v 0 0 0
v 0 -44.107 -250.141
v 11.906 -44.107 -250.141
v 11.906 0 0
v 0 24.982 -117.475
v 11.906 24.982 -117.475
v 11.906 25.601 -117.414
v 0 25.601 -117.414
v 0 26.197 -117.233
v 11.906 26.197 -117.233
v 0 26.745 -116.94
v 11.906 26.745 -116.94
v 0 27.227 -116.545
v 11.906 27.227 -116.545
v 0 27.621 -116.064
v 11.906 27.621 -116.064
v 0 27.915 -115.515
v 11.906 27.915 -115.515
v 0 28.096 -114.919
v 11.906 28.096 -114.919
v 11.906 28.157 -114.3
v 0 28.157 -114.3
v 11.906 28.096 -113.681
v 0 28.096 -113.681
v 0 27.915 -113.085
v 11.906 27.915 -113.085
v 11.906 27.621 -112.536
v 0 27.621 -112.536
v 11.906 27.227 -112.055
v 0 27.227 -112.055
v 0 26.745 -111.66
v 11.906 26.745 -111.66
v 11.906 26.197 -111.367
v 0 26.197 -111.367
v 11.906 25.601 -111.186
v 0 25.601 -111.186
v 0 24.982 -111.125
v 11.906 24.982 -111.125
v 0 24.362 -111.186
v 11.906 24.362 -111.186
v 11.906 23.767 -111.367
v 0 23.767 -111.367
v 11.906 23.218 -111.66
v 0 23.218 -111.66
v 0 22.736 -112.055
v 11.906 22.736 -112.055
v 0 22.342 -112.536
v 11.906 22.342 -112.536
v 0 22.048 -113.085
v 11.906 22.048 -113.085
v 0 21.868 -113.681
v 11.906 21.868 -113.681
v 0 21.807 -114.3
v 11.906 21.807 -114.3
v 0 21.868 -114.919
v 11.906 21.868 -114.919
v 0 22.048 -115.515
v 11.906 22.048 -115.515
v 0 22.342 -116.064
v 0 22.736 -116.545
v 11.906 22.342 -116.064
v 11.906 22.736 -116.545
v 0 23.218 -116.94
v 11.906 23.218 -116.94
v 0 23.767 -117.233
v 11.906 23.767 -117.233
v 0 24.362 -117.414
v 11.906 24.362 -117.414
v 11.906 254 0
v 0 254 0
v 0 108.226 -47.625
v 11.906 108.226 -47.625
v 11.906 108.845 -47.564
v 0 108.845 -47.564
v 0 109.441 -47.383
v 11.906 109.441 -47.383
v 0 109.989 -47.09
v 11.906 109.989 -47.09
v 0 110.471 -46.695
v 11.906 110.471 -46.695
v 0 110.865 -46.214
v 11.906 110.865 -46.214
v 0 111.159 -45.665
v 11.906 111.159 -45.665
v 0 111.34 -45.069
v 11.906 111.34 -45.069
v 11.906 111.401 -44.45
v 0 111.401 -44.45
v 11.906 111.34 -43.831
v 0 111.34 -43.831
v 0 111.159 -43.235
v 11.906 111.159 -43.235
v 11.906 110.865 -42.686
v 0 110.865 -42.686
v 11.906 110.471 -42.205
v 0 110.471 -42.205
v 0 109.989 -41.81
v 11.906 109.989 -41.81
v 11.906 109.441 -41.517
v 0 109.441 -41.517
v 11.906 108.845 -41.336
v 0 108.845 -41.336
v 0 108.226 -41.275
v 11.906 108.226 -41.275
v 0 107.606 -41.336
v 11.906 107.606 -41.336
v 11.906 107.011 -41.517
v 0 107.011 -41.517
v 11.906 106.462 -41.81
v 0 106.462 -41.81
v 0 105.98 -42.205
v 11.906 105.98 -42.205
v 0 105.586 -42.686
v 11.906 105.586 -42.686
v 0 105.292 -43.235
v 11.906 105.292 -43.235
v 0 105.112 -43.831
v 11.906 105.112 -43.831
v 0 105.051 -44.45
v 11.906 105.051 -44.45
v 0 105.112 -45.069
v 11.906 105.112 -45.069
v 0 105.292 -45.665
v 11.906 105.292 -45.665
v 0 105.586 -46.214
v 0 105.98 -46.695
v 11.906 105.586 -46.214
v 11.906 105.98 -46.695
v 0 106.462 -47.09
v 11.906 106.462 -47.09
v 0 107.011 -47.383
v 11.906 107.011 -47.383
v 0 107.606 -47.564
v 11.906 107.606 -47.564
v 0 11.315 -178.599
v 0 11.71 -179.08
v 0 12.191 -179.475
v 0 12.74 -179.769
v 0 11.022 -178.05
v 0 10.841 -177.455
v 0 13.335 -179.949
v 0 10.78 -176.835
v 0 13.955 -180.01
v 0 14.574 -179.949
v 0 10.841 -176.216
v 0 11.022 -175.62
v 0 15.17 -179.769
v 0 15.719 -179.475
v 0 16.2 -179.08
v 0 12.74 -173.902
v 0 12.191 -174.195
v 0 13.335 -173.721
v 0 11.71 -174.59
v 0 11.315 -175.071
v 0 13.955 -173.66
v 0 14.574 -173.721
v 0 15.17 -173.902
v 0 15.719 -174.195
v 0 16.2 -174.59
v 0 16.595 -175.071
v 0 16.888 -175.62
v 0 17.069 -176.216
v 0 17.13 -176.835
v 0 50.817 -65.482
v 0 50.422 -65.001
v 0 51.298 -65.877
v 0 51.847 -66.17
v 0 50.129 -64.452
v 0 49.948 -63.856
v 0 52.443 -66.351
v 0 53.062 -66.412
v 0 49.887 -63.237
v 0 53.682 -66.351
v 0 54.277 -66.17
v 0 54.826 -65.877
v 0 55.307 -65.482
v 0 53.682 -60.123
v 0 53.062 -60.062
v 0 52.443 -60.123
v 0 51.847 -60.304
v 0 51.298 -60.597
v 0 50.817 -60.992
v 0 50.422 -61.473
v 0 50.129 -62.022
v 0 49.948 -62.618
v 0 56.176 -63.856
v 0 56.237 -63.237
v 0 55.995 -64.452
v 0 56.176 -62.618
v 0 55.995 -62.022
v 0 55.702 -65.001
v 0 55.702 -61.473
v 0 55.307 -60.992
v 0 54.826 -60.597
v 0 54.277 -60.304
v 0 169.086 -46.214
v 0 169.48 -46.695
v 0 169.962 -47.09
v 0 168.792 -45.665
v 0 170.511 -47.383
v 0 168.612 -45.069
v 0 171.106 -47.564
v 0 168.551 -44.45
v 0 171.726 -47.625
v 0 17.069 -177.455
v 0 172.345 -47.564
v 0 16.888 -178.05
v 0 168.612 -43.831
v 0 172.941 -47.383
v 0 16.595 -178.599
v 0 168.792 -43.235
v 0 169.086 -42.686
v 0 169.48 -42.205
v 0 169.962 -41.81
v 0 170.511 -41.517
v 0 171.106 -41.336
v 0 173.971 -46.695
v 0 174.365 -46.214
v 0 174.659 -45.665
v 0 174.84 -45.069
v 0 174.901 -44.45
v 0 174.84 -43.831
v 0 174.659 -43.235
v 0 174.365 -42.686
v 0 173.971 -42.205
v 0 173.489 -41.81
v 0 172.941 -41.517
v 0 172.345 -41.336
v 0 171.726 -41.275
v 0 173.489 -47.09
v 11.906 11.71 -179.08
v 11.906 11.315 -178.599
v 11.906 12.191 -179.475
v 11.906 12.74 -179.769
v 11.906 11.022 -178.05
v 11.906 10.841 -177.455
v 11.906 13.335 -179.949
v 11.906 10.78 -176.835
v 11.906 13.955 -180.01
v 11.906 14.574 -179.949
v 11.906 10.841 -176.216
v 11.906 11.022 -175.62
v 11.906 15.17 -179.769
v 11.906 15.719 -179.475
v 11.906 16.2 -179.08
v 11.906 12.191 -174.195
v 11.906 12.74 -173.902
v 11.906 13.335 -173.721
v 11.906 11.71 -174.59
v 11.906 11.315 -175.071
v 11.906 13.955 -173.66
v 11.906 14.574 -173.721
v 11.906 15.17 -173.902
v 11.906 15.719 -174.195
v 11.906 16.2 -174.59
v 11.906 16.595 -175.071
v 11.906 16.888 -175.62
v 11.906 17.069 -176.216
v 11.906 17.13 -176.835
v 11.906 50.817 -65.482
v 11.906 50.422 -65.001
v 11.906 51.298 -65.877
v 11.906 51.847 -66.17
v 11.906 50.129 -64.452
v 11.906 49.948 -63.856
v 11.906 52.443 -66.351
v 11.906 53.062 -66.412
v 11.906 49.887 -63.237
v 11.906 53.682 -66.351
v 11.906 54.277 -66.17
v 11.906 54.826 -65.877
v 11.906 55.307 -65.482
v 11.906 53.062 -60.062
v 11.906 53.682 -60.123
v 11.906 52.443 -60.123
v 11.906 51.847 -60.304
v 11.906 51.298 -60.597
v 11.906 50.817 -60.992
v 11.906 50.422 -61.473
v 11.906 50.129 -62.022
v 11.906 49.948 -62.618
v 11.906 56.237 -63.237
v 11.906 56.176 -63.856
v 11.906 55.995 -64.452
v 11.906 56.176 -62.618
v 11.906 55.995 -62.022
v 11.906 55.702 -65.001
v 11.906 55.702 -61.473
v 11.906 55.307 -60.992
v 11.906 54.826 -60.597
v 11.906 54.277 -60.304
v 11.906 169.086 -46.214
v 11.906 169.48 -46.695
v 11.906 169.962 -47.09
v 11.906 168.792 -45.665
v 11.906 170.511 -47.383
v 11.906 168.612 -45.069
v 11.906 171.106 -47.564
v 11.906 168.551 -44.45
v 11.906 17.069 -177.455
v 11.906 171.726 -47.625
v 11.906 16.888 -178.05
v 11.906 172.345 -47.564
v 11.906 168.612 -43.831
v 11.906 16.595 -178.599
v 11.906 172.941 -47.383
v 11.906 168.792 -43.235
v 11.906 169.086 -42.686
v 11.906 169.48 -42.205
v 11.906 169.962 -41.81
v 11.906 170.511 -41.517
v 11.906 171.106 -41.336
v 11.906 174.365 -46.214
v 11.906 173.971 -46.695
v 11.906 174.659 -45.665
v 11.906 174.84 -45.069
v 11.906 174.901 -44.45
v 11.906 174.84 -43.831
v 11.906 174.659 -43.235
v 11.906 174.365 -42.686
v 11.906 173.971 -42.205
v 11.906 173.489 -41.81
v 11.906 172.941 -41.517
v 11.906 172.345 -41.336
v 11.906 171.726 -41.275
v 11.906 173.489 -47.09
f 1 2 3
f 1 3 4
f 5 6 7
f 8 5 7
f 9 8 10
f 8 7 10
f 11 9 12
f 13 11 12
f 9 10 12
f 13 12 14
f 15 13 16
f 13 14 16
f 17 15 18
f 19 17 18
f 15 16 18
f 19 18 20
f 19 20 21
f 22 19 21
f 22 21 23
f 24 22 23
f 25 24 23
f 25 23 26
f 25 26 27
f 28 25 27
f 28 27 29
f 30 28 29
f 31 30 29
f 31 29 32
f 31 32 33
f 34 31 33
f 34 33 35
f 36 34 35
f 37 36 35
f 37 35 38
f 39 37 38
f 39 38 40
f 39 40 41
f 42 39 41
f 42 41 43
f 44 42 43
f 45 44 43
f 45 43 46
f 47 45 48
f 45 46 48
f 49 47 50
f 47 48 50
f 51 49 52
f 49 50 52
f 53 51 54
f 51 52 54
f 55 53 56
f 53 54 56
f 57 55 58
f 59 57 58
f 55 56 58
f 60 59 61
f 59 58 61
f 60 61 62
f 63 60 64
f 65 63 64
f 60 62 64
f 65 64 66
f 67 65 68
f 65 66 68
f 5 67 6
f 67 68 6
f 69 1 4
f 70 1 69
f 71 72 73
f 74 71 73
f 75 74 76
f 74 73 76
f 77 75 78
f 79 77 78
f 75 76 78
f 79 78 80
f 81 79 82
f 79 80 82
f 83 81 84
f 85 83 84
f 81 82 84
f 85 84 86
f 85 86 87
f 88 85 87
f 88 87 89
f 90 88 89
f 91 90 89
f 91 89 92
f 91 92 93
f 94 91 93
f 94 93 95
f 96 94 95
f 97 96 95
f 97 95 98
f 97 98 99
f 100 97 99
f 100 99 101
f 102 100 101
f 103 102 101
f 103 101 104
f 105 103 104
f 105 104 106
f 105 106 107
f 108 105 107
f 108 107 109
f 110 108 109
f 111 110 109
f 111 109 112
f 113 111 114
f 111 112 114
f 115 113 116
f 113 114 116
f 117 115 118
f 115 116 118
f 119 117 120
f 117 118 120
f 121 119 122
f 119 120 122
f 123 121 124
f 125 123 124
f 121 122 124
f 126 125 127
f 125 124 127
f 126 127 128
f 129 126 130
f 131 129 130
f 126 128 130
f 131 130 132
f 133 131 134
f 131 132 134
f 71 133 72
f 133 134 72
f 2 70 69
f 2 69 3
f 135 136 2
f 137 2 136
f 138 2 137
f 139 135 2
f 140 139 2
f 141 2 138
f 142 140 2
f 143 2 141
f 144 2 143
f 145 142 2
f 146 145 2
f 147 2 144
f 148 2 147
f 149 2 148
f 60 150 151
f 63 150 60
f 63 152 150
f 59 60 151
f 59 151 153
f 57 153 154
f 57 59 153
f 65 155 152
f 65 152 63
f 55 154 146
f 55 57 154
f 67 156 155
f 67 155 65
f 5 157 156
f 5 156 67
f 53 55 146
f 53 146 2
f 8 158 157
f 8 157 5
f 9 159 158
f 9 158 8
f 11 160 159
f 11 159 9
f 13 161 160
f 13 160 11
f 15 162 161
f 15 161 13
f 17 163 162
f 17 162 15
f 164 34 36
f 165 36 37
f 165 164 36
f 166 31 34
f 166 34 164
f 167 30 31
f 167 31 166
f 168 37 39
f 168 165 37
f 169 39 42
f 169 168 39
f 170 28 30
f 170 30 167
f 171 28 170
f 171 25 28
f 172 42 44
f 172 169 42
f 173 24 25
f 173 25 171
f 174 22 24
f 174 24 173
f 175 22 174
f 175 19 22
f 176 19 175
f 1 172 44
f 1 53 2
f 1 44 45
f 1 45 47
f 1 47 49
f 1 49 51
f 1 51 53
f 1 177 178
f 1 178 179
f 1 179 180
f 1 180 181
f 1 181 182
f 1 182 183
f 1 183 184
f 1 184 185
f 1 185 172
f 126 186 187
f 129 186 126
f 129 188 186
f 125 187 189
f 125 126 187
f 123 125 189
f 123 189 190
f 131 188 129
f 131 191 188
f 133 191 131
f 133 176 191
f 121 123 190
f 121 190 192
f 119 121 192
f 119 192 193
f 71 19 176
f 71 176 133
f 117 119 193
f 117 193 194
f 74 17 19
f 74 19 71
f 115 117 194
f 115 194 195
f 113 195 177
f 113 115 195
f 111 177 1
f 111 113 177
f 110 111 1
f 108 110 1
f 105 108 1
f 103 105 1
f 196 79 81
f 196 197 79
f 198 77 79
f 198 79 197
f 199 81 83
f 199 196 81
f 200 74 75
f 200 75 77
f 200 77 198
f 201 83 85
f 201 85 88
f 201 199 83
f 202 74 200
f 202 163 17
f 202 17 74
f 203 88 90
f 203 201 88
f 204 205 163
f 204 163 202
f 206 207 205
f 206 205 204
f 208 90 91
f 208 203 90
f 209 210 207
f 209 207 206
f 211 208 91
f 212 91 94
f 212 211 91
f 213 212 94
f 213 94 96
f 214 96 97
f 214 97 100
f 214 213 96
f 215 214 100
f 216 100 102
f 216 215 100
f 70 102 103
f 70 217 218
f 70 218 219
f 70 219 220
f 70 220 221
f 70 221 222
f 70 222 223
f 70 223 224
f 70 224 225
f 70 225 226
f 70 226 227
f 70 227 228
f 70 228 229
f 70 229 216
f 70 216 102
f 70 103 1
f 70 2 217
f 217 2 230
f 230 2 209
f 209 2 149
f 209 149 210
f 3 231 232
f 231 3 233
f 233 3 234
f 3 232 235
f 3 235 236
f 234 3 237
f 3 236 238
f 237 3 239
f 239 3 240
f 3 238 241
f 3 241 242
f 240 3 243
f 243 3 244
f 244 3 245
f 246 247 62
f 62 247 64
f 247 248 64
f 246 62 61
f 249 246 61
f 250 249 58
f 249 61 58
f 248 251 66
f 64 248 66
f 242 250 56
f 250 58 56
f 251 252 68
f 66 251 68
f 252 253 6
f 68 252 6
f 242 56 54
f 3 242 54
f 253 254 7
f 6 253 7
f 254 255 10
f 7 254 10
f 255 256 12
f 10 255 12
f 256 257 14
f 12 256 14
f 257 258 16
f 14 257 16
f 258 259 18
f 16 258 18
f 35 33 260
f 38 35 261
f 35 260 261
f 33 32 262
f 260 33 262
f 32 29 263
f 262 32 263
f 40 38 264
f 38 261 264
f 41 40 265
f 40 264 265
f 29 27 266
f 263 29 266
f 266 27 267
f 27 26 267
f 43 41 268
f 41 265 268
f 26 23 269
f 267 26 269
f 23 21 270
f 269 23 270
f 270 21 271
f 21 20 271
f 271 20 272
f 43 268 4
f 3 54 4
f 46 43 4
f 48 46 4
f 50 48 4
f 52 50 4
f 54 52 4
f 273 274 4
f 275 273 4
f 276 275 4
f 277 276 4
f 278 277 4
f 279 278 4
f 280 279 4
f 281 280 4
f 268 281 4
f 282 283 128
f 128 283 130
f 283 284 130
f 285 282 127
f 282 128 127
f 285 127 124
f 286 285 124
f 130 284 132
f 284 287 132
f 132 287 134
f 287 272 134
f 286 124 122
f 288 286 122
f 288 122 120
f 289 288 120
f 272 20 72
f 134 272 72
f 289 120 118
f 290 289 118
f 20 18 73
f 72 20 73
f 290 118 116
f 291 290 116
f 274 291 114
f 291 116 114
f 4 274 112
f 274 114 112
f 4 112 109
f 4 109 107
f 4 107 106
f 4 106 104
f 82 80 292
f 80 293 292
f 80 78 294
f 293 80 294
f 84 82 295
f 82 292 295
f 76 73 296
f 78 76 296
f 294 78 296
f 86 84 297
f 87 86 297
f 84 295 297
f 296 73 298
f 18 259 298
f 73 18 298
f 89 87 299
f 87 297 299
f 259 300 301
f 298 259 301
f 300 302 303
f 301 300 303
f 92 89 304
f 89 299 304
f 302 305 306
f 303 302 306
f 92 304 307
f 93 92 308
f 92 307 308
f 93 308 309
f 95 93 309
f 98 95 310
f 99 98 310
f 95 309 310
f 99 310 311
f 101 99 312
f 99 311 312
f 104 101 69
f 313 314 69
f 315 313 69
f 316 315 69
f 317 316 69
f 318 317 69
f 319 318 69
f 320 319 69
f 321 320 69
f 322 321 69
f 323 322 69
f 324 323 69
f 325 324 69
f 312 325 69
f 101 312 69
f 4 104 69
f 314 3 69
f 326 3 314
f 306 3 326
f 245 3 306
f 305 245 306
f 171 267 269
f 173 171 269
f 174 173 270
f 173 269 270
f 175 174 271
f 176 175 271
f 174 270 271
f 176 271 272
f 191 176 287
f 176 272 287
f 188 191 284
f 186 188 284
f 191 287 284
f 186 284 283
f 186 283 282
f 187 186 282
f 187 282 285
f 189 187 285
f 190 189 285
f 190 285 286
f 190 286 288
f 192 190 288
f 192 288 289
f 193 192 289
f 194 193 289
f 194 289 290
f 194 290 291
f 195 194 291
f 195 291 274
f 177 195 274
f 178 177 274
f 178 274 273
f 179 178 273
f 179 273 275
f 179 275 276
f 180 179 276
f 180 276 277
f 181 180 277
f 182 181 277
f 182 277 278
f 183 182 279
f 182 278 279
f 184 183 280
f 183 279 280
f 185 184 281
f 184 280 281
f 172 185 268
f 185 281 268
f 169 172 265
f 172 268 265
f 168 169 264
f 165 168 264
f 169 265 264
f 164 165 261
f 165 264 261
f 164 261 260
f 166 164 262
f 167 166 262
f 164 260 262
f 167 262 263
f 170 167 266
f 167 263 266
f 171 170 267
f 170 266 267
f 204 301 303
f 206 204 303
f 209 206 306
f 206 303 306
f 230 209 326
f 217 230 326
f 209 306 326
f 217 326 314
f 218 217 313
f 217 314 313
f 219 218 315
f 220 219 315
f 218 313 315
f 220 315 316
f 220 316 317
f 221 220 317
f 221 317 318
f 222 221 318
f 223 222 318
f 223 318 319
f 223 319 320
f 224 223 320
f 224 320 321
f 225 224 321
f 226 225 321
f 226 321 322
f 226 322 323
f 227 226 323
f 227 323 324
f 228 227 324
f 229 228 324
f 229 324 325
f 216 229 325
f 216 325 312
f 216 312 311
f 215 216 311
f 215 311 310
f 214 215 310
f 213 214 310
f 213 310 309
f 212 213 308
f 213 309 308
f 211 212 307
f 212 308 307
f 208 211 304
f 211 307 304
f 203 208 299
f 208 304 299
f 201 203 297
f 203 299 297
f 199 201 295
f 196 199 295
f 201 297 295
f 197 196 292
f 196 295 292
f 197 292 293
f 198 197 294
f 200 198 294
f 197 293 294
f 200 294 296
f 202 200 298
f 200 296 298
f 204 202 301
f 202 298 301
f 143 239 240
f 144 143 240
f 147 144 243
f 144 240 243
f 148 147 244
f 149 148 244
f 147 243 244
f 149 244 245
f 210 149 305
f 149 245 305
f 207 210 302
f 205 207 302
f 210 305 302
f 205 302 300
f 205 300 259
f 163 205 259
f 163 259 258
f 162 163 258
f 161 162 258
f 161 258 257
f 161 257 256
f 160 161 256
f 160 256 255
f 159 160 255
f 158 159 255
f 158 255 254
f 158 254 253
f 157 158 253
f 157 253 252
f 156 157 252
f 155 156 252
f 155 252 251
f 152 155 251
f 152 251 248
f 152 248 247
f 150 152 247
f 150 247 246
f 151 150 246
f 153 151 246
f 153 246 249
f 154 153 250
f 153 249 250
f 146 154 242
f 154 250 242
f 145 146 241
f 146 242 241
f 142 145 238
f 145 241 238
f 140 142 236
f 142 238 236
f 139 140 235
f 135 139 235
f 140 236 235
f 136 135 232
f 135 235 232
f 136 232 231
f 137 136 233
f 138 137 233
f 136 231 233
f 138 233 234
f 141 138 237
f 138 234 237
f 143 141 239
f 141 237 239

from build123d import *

# Parameters (mm, degrees)
BOSS_EXTRUDE1_DEPTH         = 11.90625
F_1_4_0_25_DIAMETER_HOLE1_D = 6.35


with BuildPart() as part:
    # Sketch1 → Boss-Extrude1 (new body)
    with BuildSketch(Plane(origin=(0, 0, 0), x_dir=(0, 0, -1), z_dir=(1, 0, 0))):
        Polygon((0, 0), (0, 254), (250.141169265, -44.106637127), align=None)
    extrude(amount=BOSS_EXTRUDE1_DEPTH)

    # 1/4 (0.25) Diameter Hole1 (through all)
    with Locations(Plane.ZY):
        with Locations((-44.45, 171.725527446), (-44.45, 108.225527446), (-63.236968779, 53.06211718), (-114.3, 24.981539003), (-176.835292316, 13.954879721)):
            Hole(F_1_4_0_25_DIAMETER_HOLE1_D / 2)


solid = part.part
